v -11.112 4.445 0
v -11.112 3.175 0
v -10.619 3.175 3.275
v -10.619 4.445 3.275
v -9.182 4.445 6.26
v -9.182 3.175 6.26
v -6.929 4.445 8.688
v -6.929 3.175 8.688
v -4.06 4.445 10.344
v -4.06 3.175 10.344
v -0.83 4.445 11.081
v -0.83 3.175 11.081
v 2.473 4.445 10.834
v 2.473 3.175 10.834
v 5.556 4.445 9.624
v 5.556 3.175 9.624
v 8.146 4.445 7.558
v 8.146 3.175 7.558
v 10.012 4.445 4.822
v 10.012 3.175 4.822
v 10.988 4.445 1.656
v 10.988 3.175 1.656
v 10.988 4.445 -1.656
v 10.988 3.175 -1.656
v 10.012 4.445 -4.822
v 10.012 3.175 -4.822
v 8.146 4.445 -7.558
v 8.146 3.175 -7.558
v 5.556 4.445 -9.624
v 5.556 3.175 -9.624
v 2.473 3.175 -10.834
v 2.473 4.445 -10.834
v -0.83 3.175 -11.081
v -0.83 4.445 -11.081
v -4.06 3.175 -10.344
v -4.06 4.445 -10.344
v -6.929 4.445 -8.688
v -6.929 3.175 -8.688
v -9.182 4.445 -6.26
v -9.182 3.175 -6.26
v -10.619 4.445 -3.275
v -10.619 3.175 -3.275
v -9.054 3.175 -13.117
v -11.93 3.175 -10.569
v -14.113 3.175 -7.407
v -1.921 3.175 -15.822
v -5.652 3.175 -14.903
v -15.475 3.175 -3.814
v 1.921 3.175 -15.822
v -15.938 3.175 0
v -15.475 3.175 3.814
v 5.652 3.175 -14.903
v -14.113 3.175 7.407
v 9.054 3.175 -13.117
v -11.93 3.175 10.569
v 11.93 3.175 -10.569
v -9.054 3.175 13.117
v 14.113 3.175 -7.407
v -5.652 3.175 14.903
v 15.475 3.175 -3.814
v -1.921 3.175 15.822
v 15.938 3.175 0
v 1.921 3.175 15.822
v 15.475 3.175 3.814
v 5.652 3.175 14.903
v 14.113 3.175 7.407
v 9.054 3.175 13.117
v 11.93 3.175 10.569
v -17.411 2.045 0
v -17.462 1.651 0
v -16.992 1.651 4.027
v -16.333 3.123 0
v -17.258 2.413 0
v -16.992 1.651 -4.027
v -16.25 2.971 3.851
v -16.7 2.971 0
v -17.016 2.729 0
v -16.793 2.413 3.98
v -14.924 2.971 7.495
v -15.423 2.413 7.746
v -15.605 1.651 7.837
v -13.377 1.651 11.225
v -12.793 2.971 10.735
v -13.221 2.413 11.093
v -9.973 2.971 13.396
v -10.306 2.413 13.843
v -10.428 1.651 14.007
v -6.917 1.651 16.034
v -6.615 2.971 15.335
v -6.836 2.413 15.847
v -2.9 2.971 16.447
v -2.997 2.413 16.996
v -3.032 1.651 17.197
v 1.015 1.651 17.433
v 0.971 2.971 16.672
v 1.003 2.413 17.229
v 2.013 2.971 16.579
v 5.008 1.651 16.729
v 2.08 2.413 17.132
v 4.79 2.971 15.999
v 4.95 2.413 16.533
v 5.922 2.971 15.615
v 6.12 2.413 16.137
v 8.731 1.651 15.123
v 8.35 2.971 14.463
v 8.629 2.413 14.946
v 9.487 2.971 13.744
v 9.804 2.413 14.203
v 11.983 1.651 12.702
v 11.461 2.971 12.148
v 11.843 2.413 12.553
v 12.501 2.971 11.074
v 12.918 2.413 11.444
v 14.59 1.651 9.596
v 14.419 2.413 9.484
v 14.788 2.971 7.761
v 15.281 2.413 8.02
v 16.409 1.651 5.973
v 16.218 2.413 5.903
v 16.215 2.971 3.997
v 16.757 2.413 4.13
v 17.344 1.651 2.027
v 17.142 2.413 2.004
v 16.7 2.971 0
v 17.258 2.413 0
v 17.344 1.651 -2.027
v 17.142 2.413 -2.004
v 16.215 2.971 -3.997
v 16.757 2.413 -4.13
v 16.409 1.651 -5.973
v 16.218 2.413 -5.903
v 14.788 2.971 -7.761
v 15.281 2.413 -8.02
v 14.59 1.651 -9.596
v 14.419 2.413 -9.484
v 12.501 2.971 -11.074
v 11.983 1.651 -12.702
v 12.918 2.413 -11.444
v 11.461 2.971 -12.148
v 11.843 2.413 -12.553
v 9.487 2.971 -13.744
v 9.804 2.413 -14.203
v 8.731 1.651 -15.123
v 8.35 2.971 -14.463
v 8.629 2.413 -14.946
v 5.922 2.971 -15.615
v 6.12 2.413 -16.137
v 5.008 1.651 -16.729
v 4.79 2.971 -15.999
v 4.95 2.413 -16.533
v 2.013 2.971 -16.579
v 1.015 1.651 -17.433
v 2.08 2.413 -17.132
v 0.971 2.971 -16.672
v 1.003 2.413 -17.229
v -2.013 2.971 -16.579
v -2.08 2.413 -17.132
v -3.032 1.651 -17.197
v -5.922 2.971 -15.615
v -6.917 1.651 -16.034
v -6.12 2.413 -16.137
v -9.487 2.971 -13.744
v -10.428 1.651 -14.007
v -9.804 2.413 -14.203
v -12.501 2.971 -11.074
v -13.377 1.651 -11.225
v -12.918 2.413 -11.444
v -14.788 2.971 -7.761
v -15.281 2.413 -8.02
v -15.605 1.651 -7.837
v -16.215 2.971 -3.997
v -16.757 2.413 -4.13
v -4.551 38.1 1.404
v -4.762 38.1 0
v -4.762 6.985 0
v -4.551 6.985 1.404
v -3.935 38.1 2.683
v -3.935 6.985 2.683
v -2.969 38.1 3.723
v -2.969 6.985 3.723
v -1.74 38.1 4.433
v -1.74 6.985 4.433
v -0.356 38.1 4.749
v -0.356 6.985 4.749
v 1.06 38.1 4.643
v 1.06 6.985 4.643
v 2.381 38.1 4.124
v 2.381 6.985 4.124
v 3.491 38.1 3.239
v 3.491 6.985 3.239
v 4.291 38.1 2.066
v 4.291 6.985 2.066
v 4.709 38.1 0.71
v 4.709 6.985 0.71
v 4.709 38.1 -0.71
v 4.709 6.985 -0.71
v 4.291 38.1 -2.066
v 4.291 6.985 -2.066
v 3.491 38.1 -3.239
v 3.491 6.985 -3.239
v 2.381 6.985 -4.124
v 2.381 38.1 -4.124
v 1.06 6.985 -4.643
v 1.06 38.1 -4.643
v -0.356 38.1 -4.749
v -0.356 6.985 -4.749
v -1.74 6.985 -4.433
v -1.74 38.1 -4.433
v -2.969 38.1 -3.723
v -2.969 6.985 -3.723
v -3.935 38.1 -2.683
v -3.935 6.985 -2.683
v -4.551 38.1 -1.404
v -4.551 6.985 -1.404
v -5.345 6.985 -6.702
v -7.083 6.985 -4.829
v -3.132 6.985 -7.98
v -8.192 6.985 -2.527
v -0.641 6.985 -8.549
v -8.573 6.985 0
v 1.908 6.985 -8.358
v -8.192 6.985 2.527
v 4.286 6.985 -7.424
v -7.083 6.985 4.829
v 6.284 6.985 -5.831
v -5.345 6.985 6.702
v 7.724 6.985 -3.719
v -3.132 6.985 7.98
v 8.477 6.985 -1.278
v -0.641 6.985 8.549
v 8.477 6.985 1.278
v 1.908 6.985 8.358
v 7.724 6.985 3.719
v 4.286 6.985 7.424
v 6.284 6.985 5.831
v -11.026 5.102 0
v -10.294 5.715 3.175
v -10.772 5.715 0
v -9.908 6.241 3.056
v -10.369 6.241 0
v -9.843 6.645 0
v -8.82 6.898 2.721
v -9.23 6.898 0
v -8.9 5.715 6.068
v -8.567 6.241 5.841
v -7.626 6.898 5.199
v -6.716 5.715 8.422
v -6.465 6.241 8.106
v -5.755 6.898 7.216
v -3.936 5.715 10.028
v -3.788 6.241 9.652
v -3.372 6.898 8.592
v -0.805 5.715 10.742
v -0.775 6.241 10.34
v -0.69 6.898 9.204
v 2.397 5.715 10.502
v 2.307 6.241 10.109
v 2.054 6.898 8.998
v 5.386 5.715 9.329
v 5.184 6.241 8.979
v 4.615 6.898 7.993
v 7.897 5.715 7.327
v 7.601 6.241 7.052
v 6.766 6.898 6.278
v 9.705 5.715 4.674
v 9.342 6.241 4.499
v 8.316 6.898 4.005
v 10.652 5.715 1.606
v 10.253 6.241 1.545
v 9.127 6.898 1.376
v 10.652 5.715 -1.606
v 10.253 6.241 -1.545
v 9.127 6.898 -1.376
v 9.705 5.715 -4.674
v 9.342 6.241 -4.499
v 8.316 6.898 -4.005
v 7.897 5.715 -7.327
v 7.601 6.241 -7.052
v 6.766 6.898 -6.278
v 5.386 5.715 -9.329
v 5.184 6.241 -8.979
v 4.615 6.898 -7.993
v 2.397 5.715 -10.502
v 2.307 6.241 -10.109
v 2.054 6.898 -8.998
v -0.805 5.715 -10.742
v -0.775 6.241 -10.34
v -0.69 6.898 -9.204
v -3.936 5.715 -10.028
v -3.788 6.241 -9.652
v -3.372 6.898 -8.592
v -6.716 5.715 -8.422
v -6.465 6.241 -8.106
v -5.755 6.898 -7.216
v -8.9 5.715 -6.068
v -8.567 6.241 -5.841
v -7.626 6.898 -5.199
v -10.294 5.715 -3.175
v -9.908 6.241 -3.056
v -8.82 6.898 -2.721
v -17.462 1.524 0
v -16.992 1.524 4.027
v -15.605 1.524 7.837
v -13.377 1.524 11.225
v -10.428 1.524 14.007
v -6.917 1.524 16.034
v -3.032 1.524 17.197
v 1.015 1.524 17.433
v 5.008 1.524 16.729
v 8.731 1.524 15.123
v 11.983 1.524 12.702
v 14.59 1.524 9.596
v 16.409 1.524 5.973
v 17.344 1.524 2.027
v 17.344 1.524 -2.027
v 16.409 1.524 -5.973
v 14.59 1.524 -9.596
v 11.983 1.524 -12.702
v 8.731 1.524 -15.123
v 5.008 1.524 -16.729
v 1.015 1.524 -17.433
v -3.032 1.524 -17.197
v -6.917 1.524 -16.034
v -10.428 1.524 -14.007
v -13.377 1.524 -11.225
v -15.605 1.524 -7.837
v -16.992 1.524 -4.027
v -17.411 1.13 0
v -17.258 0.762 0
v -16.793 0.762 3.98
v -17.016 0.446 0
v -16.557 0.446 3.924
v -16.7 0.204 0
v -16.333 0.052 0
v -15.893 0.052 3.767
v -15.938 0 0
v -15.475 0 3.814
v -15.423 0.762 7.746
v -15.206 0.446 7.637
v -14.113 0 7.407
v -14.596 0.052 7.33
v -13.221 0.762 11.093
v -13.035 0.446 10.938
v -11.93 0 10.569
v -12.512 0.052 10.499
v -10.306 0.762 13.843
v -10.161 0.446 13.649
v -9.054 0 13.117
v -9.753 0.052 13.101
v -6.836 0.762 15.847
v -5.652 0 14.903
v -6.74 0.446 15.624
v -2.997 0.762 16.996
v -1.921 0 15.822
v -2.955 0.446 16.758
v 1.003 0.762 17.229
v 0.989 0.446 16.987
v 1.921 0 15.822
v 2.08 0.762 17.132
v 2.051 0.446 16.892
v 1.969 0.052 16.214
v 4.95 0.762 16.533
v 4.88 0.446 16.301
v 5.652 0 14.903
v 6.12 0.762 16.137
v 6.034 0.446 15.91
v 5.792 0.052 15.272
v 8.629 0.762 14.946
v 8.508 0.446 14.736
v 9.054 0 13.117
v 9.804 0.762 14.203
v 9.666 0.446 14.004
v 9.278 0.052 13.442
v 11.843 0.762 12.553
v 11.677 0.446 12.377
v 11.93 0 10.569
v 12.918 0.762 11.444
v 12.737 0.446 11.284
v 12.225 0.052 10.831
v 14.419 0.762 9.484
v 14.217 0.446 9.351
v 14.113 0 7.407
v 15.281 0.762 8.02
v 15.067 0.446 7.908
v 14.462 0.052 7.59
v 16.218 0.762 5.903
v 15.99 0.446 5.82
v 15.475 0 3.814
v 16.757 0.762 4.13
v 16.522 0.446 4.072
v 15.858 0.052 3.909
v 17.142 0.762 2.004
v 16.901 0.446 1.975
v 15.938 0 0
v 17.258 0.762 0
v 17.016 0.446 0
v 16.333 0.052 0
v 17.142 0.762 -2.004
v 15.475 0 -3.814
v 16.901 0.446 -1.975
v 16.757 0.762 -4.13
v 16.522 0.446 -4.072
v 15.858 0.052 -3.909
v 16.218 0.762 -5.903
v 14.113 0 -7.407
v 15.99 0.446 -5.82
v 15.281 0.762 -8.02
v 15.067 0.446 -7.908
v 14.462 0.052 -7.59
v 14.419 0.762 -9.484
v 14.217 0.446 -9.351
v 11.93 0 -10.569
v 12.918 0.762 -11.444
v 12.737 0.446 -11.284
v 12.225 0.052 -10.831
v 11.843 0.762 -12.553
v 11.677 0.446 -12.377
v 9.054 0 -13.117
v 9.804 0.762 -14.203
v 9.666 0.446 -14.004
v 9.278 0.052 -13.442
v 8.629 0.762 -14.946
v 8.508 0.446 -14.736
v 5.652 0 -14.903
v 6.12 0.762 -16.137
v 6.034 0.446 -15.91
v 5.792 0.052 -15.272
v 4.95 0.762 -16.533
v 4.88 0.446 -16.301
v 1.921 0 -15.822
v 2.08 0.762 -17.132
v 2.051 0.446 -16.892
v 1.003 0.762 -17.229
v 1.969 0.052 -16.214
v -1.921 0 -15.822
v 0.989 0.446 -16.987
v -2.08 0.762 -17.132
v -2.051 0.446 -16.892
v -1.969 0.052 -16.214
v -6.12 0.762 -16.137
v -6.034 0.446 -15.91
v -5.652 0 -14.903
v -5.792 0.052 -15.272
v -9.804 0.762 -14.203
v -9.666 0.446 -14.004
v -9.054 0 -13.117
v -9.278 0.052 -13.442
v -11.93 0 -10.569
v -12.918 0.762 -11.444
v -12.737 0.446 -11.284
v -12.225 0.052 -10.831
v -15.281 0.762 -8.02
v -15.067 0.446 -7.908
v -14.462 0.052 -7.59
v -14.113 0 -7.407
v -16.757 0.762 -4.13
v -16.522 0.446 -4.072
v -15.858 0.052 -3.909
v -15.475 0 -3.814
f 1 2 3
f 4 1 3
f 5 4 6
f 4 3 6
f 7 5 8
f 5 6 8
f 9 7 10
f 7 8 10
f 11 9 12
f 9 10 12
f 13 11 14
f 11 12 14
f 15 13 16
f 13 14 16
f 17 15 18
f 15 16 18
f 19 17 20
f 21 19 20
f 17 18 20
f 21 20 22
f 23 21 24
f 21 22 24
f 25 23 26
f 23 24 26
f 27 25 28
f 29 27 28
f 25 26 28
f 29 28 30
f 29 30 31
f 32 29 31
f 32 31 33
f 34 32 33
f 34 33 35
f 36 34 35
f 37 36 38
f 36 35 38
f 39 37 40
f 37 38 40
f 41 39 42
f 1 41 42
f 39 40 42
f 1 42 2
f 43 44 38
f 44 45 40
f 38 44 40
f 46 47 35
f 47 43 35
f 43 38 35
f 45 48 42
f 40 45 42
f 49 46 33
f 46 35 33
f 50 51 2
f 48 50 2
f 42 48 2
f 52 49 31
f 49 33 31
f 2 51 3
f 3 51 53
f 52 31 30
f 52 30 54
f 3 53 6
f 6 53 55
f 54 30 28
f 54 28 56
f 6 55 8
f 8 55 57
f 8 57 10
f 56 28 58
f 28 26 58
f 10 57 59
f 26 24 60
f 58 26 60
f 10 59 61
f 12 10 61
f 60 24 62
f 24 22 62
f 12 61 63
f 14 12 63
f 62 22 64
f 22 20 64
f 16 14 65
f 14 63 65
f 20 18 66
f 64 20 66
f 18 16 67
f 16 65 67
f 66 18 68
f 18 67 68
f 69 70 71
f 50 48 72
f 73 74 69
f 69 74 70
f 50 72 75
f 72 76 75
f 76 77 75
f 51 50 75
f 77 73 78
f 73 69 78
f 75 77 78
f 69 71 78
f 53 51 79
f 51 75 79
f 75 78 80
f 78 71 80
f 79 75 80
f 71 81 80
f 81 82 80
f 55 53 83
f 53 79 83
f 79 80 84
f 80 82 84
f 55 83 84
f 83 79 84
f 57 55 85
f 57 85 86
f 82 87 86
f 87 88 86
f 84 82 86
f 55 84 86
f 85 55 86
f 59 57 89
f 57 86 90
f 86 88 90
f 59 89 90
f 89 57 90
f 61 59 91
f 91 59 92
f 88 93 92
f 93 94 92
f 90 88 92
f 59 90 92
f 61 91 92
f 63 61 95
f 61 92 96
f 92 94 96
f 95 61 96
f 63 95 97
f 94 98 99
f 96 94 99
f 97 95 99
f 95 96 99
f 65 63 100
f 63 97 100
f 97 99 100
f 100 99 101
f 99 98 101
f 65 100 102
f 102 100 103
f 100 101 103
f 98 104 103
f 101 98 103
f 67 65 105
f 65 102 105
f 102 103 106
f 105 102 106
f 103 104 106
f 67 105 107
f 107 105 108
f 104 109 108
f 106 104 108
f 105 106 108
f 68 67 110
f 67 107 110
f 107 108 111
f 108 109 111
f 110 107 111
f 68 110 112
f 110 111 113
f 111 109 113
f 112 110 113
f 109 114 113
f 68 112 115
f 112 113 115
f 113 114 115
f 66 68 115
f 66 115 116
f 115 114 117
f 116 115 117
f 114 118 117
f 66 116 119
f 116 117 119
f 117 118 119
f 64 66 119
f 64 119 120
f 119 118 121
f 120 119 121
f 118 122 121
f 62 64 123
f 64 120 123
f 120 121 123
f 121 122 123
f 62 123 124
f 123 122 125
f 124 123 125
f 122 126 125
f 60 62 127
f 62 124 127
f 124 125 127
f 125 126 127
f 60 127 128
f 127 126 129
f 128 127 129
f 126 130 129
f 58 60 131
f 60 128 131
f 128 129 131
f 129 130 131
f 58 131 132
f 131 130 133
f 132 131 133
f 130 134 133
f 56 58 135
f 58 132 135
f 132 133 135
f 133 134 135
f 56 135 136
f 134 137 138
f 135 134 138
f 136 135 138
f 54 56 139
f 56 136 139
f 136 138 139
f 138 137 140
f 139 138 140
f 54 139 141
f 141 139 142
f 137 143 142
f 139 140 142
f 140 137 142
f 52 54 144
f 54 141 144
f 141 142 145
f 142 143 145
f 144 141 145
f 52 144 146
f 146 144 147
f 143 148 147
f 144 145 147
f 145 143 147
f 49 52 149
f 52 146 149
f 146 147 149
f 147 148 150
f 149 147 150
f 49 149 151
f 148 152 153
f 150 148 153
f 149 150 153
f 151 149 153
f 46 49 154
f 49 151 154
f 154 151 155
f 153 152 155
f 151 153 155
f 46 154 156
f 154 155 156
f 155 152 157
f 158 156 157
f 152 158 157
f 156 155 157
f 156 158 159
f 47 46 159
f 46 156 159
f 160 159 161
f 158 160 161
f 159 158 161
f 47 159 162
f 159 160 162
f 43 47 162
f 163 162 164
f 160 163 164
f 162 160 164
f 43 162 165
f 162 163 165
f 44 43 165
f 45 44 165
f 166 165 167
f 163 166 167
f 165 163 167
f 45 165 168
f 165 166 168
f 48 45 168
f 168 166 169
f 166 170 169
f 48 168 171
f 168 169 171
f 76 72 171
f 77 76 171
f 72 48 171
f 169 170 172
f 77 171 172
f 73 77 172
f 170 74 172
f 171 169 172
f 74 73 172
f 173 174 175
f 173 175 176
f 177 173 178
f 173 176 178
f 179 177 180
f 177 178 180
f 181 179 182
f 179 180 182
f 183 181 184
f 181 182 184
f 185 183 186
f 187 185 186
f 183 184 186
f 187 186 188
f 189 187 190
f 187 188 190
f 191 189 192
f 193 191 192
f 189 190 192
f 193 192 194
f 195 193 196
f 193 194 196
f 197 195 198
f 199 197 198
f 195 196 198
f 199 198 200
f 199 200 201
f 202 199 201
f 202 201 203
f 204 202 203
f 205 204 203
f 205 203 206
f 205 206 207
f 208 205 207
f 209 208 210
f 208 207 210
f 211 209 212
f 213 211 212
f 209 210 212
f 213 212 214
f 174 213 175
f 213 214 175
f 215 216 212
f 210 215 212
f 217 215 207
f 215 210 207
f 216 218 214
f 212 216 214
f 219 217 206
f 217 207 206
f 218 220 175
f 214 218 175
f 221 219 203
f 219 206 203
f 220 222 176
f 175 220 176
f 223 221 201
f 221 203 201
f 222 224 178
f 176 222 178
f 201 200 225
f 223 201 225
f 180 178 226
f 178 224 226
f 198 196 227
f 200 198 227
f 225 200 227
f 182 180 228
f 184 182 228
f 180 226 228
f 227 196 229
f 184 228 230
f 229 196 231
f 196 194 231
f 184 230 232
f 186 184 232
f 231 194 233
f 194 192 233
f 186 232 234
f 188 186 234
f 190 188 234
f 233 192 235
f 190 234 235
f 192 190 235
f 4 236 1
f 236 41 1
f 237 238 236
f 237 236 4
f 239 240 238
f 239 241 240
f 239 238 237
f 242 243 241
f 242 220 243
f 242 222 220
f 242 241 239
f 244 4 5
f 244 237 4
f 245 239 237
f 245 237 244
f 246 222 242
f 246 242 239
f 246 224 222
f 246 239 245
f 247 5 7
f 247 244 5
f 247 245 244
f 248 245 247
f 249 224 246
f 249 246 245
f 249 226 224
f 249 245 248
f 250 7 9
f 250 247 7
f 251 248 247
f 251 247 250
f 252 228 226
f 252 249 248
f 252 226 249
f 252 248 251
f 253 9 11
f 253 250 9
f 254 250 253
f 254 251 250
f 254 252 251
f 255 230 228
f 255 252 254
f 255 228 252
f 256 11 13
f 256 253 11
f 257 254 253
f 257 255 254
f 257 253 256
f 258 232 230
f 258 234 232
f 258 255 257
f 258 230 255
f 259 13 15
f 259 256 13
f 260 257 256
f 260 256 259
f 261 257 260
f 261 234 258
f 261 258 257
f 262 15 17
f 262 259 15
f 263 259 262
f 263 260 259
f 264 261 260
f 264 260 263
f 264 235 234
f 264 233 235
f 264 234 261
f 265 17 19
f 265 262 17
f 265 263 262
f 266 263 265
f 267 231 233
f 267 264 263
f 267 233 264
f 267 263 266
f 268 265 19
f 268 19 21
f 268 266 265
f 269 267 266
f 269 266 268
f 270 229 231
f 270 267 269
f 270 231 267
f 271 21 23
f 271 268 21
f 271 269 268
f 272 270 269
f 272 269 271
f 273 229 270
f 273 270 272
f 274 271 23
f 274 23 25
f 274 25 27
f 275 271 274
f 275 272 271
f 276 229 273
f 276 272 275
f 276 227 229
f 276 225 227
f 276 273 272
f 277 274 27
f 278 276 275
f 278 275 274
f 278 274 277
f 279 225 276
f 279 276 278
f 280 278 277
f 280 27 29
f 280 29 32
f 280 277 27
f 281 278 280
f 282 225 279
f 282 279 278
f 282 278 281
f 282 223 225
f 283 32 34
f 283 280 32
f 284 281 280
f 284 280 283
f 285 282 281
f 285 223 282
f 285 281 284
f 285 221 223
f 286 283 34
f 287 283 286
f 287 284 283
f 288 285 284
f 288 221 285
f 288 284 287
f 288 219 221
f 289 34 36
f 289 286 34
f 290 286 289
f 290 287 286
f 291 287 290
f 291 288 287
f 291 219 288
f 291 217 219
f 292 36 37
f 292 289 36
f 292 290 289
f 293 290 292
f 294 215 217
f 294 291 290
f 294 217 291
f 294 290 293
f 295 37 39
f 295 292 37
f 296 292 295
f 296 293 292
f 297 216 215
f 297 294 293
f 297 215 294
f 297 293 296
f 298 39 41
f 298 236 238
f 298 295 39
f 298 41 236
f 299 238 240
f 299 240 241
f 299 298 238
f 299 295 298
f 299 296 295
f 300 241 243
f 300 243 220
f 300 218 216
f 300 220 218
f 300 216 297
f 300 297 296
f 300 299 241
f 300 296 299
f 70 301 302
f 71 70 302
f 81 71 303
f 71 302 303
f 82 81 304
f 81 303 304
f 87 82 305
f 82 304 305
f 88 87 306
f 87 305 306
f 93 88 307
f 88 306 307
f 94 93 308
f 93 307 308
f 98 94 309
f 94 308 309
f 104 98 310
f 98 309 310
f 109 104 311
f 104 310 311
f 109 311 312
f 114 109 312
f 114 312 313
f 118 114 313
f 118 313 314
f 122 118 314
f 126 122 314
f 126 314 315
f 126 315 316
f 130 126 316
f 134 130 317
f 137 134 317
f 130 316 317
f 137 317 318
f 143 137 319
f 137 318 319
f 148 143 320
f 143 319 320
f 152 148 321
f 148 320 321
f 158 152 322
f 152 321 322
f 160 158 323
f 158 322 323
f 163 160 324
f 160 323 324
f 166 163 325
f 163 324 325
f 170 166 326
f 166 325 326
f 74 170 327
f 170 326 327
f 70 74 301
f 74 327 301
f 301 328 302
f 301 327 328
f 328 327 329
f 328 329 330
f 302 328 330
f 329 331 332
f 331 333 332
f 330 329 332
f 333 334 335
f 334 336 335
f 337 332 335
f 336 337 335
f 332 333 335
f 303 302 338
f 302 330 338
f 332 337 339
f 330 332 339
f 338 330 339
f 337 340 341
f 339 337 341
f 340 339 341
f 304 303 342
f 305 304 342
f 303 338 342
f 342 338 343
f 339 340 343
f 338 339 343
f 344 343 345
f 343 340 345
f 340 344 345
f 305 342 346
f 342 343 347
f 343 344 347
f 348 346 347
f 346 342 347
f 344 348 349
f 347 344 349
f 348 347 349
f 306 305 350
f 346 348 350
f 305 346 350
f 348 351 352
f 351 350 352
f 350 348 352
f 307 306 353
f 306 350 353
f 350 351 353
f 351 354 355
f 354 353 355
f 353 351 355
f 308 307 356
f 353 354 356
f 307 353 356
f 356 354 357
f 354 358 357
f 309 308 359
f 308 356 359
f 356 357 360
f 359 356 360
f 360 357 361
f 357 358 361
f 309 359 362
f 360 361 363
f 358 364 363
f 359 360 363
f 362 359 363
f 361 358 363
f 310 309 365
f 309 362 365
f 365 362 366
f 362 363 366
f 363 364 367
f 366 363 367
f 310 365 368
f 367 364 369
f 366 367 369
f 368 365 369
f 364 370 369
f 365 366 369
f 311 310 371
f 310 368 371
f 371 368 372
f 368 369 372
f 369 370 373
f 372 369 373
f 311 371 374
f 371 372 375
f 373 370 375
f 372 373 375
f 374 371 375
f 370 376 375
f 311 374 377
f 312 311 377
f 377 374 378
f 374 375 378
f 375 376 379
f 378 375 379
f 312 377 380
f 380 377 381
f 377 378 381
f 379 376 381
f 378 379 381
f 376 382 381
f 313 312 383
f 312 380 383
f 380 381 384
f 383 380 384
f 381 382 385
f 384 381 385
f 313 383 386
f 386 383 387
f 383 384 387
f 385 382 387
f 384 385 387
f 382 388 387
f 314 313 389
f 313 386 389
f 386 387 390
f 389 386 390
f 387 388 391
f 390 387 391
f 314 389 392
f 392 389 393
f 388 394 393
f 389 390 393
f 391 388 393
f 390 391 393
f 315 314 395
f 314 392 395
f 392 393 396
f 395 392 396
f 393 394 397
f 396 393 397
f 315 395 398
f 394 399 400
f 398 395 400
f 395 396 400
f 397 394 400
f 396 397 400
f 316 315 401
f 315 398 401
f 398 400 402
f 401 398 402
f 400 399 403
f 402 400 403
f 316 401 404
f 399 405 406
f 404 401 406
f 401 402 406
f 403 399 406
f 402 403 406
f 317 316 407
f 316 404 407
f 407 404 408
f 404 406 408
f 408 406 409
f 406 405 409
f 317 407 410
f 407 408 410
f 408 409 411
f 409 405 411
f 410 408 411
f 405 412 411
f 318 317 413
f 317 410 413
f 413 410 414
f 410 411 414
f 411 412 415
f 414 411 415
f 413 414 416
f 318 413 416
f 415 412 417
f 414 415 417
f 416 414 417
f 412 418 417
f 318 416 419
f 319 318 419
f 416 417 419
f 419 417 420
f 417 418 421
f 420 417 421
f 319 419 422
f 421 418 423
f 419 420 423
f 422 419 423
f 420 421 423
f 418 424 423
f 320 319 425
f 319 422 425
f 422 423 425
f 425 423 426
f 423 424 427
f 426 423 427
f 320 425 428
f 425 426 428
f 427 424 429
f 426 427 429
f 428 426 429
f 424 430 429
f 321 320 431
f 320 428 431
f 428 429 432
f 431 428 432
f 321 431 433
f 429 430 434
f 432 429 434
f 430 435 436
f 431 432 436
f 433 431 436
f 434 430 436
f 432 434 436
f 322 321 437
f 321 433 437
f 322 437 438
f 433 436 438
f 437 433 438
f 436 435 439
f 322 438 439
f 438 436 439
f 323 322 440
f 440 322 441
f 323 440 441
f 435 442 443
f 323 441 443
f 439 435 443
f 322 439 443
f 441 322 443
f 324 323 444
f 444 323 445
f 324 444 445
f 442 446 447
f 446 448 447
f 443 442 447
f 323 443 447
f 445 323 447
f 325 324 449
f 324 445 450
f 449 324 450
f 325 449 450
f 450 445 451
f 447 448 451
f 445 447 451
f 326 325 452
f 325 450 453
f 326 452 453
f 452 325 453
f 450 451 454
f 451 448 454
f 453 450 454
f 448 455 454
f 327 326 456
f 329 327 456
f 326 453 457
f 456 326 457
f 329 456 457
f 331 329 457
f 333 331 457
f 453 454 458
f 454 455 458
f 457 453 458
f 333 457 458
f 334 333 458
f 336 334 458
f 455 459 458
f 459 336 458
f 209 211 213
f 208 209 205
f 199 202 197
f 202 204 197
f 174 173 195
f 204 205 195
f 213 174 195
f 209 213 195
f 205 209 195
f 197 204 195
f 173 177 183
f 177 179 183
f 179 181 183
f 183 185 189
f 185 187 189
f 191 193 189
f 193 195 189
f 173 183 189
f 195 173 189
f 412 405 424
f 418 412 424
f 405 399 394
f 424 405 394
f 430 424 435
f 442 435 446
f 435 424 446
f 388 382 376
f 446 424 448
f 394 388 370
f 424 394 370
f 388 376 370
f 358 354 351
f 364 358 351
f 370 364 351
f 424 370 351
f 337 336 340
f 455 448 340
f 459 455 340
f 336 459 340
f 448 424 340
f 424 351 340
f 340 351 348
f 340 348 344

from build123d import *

# Parameters (mm, degrees)
FILLET2_R = 1.524
FILLET3_R = 2.54


with BuildPart() as part:
    # Sketch1 → Base-Revolve (revolve)
    with BuildSketch(Plane.XY):
        Polygon((0, 0), (0, 38.1), (-4.7625, 38.1), (-4.7625, 6.985), (-11.1125, 6.985), (-11.1125, 3.175), (-17.4625, 3.175), (-17.4625, 0), align=None)
    revolve(axis=Axis((0, 0, 0), (0, 1, 0)))

    # Fillet2
    fillet2_edges = [part.edges().sort_by_distance(p)[0] for p in [
        (17.4625, 3.175, 0),
        (17.4625, 0, 0),
    ]]
    fillet(fillet2_edges, radius=FILLET2_R)

    # Fillet3
    fillet3_edges = [part.edges().sort_by_distance(p)[0] for p in [
        (11.1125, 6.985, 0),
    ]]
    fillet(fillet3_edges, radius=FILLET3_R)


solid = part.part
